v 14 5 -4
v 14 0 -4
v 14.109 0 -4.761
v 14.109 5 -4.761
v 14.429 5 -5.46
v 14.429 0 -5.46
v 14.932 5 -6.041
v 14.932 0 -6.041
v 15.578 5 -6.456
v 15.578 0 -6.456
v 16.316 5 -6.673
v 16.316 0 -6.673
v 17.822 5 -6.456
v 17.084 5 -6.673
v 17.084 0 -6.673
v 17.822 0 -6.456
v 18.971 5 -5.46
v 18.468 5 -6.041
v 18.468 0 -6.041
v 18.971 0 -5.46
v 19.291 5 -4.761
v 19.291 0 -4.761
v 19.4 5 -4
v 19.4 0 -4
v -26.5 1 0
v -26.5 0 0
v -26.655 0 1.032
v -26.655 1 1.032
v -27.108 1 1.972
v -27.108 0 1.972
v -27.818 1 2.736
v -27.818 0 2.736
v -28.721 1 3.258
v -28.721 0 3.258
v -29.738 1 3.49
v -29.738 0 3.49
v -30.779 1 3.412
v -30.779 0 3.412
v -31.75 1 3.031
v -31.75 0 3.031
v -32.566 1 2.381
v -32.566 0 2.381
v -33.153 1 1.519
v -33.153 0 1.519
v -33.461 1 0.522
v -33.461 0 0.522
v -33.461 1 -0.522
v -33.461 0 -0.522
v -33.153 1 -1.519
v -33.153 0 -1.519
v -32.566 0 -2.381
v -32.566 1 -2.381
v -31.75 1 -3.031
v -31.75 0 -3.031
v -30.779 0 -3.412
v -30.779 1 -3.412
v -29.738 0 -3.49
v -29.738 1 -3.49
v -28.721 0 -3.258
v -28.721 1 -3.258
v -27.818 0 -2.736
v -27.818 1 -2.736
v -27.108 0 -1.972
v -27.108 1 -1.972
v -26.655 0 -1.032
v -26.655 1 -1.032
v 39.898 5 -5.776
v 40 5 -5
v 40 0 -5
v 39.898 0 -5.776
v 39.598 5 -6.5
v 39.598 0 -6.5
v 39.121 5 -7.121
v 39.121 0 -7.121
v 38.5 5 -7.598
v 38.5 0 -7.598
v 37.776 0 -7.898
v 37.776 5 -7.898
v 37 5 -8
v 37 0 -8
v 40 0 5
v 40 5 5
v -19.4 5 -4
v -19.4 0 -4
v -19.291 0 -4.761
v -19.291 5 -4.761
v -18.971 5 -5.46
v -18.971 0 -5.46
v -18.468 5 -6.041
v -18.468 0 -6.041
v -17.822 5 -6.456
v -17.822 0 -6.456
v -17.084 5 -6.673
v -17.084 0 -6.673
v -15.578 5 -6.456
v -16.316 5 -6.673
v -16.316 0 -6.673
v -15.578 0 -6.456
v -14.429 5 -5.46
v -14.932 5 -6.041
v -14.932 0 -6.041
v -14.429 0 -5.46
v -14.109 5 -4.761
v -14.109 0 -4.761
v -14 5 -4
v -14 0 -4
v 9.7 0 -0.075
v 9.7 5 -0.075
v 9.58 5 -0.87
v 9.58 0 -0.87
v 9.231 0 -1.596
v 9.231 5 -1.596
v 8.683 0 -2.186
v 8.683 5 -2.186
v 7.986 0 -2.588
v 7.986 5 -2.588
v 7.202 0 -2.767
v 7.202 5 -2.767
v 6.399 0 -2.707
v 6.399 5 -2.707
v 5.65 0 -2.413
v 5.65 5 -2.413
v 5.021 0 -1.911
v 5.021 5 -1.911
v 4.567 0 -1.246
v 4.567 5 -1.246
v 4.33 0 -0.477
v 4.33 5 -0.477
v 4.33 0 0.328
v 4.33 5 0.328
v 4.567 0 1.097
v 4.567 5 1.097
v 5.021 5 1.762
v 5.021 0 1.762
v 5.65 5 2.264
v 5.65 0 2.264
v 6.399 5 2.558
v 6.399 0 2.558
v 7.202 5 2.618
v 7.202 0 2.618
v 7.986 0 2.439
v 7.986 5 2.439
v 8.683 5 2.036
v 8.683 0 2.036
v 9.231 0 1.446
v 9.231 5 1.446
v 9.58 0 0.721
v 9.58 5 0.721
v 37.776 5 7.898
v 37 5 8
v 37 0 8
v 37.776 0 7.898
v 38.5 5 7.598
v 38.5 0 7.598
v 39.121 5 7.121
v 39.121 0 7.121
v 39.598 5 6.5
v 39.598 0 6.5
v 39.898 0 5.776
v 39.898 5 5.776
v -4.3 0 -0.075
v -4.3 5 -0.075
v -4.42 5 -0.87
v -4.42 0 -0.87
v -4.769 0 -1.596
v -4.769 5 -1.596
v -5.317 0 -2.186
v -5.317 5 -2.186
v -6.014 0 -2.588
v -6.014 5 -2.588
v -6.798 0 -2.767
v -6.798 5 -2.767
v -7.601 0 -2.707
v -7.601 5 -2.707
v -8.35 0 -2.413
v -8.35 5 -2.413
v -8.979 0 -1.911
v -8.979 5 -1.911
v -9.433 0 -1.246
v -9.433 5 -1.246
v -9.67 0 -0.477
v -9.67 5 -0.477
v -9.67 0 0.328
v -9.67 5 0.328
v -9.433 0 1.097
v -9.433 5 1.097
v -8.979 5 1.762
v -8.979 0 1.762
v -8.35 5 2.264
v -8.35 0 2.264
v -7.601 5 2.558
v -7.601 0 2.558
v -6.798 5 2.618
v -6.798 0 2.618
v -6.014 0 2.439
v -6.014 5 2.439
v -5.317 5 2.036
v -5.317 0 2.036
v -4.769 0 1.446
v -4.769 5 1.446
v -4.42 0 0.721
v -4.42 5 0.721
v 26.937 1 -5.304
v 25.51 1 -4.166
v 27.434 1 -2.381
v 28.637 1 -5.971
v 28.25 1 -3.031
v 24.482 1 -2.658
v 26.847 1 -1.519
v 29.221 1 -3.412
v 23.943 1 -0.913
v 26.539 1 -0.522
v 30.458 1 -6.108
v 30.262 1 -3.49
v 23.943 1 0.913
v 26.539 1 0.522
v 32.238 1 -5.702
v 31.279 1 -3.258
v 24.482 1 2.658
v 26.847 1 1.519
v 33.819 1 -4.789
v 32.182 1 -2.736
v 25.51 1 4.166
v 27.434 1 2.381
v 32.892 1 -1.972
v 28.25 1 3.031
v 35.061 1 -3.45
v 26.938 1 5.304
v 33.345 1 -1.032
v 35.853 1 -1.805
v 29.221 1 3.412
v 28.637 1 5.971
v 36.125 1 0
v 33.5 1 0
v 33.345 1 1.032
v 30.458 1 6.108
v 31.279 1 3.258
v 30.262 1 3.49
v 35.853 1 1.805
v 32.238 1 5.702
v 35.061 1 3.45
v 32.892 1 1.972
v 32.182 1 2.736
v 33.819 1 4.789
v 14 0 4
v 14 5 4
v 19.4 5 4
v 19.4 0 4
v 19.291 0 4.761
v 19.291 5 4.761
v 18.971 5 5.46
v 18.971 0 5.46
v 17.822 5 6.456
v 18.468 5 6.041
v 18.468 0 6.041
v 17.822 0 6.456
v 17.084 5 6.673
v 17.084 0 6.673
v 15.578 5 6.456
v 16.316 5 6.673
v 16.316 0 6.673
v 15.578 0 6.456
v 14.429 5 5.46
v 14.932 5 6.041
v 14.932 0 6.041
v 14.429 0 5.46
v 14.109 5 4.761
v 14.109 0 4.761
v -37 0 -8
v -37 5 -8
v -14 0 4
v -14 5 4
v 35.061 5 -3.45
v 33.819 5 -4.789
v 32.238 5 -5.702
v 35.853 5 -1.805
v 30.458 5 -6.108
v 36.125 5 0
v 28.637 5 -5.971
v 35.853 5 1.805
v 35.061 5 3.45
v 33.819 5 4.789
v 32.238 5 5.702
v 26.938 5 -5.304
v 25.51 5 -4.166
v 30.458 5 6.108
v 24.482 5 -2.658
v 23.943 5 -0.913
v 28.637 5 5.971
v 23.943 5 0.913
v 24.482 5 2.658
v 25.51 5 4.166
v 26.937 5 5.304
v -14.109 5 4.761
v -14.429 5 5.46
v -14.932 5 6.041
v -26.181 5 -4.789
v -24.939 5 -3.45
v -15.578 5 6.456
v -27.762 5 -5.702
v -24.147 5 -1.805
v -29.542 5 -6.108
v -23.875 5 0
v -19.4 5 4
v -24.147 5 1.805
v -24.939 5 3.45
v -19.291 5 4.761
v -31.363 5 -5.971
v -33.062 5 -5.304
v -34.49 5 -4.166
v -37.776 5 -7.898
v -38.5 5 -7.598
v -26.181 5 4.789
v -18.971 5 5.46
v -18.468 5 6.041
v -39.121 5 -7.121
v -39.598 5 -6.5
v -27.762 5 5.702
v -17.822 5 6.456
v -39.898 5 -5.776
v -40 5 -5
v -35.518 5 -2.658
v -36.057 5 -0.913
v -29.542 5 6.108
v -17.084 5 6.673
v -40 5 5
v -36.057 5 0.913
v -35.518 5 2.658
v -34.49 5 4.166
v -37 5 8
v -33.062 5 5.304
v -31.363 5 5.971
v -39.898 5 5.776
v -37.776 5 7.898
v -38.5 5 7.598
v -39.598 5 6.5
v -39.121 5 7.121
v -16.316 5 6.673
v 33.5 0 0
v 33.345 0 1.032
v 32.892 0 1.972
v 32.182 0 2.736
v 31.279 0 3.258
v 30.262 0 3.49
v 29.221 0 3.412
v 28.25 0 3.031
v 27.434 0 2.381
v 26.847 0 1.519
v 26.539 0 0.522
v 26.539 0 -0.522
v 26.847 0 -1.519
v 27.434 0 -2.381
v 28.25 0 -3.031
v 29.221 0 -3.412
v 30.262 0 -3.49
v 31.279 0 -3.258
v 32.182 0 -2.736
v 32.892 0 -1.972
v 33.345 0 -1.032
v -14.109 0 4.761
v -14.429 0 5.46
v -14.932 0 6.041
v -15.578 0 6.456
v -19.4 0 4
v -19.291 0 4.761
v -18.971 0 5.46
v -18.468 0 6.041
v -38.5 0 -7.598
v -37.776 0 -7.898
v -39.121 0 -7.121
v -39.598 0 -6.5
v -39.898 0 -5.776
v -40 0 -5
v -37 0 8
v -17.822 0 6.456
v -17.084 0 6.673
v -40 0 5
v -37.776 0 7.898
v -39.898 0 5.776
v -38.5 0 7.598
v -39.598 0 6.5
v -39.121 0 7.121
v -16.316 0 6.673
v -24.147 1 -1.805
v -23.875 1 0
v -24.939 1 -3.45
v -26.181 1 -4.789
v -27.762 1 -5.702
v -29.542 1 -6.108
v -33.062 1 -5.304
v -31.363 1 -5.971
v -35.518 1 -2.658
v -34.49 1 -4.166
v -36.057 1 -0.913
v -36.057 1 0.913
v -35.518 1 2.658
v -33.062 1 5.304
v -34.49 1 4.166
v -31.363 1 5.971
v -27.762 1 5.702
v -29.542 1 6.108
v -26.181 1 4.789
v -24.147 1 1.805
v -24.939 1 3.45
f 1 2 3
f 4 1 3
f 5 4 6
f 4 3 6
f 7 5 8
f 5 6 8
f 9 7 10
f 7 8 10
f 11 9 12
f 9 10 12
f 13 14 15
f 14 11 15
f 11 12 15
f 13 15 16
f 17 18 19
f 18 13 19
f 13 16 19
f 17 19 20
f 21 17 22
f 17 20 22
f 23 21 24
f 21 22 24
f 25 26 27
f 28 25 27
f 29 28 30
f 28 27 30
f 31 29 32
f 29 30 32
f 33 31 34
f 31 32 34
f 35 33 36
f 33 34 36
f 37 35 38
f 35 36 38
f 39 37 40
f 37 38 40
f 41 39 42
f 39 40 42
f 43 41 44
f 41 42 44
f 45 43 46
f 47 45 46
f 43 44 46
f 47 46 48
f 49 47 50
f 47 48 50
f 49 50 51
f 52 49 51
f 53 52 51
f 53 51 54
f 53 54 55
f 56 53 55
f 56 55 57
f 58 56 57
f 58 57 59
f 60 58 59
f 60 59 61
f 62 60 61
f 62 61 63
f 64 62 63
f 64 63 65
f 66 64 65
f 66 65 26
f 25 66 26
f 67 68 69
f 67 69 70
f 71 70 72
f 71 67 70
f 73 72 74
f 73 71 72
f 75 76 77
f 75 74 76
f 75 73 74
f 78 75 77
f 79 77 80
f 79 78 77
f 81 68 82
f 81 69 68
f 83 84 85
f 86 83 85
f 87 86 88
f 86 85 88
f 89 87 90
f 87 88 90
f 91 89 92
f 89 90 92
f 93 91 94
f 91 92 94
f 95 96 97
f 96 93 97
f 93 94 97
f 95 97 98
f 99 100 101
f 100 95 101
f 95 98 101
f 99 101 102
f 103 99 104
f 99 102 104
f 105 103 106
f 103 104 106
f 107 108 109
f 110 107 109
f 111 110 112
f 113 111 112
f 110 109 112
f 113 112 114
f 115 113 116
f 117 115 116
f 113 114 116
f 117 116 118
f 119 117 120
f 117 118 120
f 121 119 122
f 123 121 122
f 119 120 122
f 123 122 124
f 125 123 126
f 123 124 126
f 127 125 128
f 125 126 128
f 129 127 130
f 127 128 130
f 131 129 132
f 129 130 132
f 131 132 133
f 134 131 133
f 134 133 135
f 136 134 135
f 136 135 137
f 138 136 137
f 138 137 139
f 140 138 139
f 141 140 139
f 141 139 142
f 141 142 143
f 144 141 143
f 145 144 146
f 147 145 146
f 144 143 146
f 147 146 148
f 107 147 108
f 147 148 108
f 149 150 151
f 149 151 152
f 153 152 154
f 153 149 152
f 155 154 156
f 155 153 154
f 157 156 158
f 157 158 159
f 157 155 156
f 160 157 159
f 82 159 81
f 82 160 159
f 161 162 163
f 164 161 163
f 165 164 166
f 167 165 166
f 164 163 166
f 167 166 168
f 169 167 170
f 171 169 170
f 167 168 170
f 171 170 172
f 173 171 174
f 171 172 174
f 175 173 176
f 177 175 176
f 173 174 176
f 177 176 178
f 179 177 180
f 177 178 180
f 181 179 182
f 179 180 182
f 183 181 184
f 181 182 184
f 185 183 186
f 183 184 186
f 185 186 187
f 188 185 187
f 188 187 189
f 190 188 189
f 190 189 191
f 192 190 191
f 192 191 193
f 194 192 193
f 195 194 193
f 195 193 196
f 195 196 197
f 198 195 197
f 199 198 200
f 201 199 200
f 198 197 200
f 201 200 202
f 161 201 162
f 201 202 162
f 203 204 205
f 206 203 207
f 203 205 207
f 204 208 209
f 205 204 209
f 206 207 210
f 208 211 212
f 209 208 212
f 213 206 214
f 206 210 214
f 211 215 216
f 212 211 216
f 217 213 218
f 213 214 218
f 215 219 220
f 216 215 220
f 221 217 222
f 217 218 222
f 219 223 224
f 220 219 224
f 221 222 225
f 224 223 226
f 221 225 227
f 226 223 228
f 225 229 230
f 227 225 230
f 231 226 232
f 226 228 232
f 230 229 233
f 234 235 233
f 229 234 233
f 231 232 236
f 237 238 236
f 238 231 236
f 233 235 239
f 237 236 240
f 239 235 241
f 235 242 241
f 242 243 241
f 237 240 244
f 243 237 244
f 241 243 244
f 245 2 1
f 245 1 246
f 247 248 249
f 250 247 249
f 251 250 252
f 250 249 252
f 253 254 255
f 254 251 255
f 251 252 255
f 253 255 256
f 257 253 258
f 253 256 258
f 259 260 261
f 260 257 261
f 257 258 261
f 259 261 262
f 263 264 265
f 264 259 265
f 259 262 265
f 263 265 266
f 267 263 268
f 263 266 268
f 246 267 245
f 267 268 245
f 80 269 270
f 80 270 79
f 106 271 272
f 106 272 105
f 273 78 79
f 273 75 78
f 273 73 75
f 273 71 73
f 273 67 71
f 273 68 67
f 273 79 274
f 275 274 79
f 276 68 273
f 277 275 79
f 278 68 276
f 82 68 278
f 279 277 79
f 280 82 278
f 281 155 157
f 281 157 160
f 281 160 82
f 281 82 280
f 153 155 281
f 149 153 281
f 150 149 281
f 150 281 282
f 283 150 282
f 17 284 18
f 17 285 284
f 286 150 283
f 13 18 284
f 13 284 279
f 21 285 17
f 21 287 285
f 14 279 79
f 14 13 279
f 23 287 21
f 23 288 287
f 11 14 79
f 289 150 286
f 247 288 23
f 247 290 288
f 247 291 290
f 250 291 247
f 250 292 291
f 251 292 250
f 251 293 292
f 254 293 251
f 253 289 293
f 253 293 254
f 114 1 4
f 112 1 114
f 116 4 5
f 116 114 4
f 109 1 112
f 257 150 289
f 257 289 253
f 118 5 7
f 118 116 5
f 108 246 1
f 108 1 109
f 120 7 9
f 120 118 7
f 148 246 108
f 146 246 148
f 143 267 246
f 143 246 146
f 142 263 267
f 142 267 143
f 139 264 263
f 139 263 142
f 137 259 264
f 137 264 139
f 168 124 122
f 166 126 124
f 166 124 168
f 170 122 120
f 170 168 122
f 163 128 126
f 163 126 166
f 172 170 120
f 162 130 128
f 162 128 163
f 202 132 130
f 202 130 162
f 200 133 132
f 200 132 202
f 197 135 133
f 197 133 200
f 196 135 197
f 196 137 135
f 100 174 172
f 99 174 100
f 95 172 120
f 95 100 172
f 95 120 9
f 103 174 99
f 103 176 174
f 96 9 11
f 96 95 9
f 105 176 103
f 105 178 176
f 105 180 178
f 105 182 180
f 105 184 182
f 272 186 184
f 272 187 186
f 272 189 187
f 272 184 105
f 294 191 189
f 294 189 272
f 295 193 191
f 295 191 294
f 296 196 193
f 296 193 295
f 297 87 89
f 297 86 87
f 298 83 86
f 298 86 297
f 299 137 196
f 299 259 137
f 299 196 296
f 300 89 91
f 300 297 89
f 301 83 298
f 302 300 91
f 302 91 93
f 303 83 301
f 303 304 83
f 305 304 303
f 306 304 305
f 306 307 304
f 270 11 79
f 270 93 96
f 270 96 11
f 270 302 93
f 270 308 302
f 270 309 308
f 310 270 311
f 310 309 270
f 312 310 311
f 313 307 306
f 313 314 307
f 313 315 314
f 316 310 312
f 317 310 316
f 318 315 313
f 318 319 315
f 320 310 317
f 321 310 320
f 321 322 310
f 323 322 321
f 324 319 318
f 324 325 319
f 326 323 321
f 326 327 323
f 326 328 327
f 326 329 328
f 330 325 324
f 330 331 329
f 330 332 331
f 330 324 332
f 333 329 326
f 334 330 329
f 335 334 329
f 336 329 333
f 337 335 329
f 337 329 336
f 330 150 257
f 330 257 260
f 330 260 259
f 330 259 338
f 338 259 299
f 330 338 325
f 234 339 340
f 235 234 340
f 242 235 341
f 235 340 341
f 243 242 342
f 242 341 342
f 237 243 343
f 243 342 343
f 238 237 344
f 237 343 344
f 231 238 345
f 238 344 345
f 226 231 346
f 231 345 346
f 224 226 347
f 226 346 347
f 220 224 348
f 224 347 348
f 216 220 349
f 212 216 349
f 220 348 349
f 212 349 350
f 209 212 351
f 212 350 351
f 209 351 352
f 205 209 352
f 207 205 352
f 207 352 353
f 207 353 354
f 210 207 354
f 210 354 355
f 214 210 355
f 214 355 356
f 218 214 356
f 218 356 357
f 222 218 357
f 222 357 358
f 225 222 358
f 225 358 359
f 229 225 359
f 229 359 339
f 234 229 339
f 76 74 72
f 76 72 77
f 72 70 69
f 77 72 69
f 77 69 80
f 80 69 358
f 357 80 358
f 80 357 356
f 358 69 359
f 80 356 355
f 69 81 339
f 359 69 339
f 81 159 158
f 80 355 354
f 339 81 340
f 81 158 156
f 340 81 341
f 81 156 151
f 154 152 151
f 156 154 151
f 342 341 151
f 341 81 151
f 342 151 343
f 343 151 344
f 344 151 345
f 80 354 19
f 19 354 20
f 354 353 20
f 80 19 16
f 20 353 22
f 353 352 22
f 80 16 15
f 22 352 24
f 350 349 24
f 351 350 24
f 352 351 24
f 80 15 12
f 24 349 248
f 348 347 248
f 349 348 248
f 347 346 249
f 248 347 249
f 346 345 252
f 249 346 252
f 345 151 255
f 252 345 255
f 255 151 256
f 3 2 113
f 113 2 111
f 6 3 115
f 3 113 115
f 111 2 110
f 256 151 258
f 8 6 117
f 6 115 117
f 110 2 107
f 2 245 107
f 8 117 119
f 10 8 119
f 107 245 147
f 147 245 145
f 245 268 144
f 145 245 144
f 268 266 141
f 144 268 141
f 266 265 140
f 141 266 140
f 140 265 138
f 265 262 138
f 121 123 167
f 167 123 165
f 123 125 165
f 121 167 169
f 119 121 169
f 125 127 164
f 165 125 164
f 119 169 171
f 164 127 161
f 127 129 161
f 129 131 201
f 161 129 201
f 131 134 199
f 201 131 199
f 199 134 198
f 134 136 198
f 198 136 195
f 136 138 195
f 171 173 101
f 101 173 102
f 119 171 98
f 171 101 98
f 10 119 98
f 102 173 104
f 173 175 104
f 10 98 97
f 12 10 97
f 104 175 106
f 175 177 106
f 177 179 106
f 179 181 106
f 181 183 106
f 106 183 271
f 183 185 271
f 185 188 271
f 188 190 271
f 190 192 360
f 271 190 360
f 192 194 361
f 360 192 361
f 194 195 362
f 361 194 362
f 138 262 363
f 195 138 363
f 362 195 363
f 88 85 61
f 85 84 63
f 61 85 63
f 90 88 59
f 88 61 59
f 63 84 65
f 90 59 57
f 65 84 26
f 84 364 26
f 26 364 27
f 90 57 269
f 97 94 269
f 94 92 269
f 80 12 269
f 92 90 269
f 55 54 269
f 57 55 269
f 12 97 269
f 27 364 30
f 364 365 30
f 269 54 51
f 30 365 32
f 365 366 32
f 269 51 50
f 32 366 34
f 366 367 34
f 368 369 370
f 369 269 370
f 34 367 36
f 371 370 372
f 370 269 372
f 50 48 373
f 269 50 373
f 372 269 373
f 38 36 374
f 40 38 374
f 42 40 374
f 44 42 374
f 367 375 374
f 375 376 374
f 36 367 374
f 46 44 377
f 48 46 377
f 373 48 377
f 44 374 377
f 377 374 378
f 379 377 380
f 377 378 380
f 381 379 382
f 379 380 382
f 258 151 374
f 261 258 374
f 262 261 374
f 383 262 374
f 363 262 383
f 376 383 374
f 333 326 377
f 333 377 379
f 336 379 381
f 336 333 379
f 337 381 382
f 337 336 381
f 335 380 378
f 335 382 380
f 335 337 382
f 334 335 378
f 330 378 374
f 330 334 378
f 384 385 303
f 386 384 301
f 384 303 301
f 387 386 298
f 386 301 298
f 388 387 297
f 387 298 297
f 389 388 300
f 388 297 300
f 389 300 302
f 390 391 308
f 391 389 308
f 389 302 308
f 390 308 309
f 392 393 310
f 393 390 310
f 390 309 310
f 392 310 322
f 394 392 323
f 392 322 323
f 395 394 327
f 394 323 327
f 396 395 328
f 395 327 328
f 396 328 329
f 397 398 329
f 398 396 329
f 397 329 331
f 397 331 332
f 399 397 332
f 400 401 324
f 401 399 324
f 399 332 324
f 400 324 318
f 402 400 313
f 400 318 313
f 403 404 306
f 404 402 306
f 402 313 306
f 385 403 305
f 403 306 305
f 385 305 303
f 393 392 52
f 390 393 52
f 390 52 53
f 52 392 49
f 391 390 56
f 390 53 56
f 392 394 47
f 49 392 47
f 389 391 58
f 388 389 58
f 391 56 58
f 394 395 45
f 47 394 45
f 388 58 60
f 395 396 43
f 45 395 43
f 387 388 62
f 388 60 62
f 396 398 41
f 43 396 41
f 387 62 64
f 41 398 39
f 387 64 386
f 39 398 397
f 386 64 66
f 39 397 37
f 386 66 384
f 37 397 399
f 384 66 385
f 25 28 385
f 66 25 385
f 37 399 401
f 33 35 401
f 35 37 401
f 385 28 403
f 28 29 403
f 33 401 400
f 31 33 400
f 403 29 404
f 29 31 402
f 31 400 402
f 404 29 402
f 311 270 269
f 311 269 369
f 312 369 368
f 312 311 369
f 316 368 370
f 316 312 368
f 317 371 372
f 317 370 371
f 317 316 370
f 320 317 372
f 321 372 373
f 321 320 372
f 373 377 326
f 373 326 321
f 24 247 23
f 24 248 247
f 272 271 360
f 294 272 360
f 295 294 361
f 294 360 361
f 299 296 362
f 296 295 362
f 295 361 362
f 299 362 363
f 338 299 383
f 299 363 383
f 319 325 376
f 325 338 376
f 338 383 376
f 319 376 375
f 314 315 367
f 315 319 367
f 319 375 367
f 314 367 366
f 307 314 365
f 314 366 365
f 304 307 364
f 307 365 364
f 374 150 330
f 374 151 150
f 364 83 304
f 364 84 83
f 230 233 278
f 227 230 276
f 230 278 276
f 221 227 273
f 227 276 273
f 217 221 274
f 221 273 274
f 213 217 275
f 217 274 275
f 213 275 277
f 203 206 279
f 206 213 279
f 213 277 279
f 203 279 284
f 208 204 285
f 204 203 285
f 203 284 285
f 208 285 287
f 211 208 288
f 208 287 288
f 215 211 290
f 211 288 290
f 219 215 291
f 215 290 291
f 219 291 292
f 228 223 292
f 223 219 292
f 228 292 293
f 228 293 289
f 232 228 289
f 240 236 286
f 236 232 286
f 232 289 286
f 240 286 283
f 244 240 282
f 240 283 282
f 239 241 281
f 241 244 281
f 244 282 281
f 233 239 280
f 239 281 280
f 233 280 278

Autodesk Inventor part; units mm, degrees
ref_plane "YZ Plane" through (0, 0, 0) normal (1, 0, 0) x (0, 1, 0)
ref_plane "XZ Plane" through (0, 0, 0) normal (0, 1, 0) x (-1, 0, 0)
ref_plane "XY Plane" through (0, 0, 0) normal (0, 0, 1) x (1, 0, 0)
sketch "Boceto1" plane through (0, 0, 0) normal (0, 1, 0) x (-1, 0, 0)
  line L0 (-40, 8) -> (40, 8)
  line L1 (40, 8) -> (40, -8)
  line L2 (40, -8) -> (-40, -8)
  line L3 (-40, -8) -> (-40, 8)
  line L4 (-40, 8) -> (40, -8) construction
  line L5 (40, 8) -> (-40, -8) construction
  circle A0 centre (-16.7, 4) radius 2.7
  circle A1 centre (-16.7, -4) radius 2.7
  circle A2 centre (16.7, 4) radius 2.7
  circle A3 centre (16.7, -4) radius 2.7
  line L6 (19.4, 4) -> (14, 4)
  line L7 (14, 4) -> (14, -4)
  line L8 (14, -4) -> (19.4, -4)
  line L9 (19.4, -4) -> (19.4, 4)
  line L10 (-14, 4) -> (-19.4, 4)
  line L11 (-19.4, 4) -> (-19.4, -4)
  line L12 (-19.4, -4) -> (-14, -4)
  line L13 (-14, -4) -> (-14, 4)
  point P0 (0, 0)
  point P1 (16.7, -4)
  point P2 (16.7, 4)
  point P3 (-16.7, -4)
  point P4 (-16.7, 4)
  point P5 (19.4, -4)
  point P6 (-14, -4)
  point P7 (-19.4, -4)
  point P8 (-19.4, 4)
  dimension "d2" = 5.4
  dimension "d0" = 80
  dimension "d1" = 16
  dimension "d3" = 4
  dimension "d4" = 8
  dimension "d5" = 23.3
  dimension "d35" = 23.3
extrude "Extrusión1" add sketch "Boceto1" along normal blind 5
fillet "Empalme2" radius 3 4 edges at (-40, 2.5, 8) (-40, 2.5, -8) (40, 2.5, 8) (40, 2.5, -8)
sketch "Boceto6" plane through (0, 5, 0) normal (0, 1, 0) x (1, 0, 0)
  circle A0 centre (-30, 0) radius 6.125
  circle A1 centre (30, 0) radius 6.125
  point P0 (0, 0)
  dimension "d27" = 12.25
  dimension "d28" = 30
  dimension "d29" = 30
extrude "Extrusión6" cut sketch "Boceto6" against normal through all
sketch "Boceto7" plane through (0, 0, 0) normal (0, -1, 0) x (1, 0, 0)
  circle A0 centre (-30, 0) radius 6.125 projected
  circle A1 centre (30, 0) radius 6.125 projected
  circle A2 centre (-30, 0) radius 3.5
  circle A3 centre (30, 0) radius 3.5
  point P0 (0, 0)
  point P1 (18.5632, -5.9541)
  point P2 (18.5632, 5.9541)
  dimension "d32" = 7
extrude "Extrusión7" add sketch "Boceto7" against normal blind 1
sketch "Boceto9" plane through (0, 5, 0) normal (0, 1, 0) x (1, 0, 0)
  circle A0 centre (-7, 0.0746) radius 2.7
  circle A1 centre (7, 0.0746) radius 2.7
  point P0 (0, 0)
  dimension "d36" = 5.4
  dimension "d39" = 7
  dimension "d40" = 7
extrude "Extrusión8" cut sketch "Boceto9" against normal through all
sketch "Boceto5" plane through (0, 0, 0) normal (0, -1, 0) x (1, 0, 0)
  circle A0 centre (-30, -4.1) radius 1.7 projected
  circle A1 centre (-30, -4.1) radius 2.875
  circle A2 centre (20, -4.1) radius 1.7 projected
  circle A3 centre (20, -4.1) radius 2.875
  line L0 (-33.3198, -4.1) -> (-31.6599, -1.225)
  line L1 (-31.6599, -1.225) -> (-28.3401, -1.225)
  line L2 (-28.3401, -1.225) -> (-26.6802, -4.1)
  line L3 (-26.6802, -4.1) -> (-28.3401, -6.975)
  line L4 (-28.3401, -6.975) -> (-31.6599, -6.975)
  line L5 (-31.6599, -6.975) -> (-33.3198, -4.1)
  line L6 (16.6802, -4.1) -> (18.3401, -1.225)
  line L7 (18.3401, -1.225) -> (21.6599, -1.225)
  line L8 (21.6599, -1.225) -> (23.3198, -4.1)
  line L9 (23.3198, -4.1) -> (21.6599, -6.975)
  line L10 (21.6599, -6.975) -> (18.3401, -6.975)
  line L11 (18.3401, -6.975) -> (16.6802, -4.1)
  point P0 (0, 0)
  dimension "d24" = 5.75
properties part number "Rack support b"
